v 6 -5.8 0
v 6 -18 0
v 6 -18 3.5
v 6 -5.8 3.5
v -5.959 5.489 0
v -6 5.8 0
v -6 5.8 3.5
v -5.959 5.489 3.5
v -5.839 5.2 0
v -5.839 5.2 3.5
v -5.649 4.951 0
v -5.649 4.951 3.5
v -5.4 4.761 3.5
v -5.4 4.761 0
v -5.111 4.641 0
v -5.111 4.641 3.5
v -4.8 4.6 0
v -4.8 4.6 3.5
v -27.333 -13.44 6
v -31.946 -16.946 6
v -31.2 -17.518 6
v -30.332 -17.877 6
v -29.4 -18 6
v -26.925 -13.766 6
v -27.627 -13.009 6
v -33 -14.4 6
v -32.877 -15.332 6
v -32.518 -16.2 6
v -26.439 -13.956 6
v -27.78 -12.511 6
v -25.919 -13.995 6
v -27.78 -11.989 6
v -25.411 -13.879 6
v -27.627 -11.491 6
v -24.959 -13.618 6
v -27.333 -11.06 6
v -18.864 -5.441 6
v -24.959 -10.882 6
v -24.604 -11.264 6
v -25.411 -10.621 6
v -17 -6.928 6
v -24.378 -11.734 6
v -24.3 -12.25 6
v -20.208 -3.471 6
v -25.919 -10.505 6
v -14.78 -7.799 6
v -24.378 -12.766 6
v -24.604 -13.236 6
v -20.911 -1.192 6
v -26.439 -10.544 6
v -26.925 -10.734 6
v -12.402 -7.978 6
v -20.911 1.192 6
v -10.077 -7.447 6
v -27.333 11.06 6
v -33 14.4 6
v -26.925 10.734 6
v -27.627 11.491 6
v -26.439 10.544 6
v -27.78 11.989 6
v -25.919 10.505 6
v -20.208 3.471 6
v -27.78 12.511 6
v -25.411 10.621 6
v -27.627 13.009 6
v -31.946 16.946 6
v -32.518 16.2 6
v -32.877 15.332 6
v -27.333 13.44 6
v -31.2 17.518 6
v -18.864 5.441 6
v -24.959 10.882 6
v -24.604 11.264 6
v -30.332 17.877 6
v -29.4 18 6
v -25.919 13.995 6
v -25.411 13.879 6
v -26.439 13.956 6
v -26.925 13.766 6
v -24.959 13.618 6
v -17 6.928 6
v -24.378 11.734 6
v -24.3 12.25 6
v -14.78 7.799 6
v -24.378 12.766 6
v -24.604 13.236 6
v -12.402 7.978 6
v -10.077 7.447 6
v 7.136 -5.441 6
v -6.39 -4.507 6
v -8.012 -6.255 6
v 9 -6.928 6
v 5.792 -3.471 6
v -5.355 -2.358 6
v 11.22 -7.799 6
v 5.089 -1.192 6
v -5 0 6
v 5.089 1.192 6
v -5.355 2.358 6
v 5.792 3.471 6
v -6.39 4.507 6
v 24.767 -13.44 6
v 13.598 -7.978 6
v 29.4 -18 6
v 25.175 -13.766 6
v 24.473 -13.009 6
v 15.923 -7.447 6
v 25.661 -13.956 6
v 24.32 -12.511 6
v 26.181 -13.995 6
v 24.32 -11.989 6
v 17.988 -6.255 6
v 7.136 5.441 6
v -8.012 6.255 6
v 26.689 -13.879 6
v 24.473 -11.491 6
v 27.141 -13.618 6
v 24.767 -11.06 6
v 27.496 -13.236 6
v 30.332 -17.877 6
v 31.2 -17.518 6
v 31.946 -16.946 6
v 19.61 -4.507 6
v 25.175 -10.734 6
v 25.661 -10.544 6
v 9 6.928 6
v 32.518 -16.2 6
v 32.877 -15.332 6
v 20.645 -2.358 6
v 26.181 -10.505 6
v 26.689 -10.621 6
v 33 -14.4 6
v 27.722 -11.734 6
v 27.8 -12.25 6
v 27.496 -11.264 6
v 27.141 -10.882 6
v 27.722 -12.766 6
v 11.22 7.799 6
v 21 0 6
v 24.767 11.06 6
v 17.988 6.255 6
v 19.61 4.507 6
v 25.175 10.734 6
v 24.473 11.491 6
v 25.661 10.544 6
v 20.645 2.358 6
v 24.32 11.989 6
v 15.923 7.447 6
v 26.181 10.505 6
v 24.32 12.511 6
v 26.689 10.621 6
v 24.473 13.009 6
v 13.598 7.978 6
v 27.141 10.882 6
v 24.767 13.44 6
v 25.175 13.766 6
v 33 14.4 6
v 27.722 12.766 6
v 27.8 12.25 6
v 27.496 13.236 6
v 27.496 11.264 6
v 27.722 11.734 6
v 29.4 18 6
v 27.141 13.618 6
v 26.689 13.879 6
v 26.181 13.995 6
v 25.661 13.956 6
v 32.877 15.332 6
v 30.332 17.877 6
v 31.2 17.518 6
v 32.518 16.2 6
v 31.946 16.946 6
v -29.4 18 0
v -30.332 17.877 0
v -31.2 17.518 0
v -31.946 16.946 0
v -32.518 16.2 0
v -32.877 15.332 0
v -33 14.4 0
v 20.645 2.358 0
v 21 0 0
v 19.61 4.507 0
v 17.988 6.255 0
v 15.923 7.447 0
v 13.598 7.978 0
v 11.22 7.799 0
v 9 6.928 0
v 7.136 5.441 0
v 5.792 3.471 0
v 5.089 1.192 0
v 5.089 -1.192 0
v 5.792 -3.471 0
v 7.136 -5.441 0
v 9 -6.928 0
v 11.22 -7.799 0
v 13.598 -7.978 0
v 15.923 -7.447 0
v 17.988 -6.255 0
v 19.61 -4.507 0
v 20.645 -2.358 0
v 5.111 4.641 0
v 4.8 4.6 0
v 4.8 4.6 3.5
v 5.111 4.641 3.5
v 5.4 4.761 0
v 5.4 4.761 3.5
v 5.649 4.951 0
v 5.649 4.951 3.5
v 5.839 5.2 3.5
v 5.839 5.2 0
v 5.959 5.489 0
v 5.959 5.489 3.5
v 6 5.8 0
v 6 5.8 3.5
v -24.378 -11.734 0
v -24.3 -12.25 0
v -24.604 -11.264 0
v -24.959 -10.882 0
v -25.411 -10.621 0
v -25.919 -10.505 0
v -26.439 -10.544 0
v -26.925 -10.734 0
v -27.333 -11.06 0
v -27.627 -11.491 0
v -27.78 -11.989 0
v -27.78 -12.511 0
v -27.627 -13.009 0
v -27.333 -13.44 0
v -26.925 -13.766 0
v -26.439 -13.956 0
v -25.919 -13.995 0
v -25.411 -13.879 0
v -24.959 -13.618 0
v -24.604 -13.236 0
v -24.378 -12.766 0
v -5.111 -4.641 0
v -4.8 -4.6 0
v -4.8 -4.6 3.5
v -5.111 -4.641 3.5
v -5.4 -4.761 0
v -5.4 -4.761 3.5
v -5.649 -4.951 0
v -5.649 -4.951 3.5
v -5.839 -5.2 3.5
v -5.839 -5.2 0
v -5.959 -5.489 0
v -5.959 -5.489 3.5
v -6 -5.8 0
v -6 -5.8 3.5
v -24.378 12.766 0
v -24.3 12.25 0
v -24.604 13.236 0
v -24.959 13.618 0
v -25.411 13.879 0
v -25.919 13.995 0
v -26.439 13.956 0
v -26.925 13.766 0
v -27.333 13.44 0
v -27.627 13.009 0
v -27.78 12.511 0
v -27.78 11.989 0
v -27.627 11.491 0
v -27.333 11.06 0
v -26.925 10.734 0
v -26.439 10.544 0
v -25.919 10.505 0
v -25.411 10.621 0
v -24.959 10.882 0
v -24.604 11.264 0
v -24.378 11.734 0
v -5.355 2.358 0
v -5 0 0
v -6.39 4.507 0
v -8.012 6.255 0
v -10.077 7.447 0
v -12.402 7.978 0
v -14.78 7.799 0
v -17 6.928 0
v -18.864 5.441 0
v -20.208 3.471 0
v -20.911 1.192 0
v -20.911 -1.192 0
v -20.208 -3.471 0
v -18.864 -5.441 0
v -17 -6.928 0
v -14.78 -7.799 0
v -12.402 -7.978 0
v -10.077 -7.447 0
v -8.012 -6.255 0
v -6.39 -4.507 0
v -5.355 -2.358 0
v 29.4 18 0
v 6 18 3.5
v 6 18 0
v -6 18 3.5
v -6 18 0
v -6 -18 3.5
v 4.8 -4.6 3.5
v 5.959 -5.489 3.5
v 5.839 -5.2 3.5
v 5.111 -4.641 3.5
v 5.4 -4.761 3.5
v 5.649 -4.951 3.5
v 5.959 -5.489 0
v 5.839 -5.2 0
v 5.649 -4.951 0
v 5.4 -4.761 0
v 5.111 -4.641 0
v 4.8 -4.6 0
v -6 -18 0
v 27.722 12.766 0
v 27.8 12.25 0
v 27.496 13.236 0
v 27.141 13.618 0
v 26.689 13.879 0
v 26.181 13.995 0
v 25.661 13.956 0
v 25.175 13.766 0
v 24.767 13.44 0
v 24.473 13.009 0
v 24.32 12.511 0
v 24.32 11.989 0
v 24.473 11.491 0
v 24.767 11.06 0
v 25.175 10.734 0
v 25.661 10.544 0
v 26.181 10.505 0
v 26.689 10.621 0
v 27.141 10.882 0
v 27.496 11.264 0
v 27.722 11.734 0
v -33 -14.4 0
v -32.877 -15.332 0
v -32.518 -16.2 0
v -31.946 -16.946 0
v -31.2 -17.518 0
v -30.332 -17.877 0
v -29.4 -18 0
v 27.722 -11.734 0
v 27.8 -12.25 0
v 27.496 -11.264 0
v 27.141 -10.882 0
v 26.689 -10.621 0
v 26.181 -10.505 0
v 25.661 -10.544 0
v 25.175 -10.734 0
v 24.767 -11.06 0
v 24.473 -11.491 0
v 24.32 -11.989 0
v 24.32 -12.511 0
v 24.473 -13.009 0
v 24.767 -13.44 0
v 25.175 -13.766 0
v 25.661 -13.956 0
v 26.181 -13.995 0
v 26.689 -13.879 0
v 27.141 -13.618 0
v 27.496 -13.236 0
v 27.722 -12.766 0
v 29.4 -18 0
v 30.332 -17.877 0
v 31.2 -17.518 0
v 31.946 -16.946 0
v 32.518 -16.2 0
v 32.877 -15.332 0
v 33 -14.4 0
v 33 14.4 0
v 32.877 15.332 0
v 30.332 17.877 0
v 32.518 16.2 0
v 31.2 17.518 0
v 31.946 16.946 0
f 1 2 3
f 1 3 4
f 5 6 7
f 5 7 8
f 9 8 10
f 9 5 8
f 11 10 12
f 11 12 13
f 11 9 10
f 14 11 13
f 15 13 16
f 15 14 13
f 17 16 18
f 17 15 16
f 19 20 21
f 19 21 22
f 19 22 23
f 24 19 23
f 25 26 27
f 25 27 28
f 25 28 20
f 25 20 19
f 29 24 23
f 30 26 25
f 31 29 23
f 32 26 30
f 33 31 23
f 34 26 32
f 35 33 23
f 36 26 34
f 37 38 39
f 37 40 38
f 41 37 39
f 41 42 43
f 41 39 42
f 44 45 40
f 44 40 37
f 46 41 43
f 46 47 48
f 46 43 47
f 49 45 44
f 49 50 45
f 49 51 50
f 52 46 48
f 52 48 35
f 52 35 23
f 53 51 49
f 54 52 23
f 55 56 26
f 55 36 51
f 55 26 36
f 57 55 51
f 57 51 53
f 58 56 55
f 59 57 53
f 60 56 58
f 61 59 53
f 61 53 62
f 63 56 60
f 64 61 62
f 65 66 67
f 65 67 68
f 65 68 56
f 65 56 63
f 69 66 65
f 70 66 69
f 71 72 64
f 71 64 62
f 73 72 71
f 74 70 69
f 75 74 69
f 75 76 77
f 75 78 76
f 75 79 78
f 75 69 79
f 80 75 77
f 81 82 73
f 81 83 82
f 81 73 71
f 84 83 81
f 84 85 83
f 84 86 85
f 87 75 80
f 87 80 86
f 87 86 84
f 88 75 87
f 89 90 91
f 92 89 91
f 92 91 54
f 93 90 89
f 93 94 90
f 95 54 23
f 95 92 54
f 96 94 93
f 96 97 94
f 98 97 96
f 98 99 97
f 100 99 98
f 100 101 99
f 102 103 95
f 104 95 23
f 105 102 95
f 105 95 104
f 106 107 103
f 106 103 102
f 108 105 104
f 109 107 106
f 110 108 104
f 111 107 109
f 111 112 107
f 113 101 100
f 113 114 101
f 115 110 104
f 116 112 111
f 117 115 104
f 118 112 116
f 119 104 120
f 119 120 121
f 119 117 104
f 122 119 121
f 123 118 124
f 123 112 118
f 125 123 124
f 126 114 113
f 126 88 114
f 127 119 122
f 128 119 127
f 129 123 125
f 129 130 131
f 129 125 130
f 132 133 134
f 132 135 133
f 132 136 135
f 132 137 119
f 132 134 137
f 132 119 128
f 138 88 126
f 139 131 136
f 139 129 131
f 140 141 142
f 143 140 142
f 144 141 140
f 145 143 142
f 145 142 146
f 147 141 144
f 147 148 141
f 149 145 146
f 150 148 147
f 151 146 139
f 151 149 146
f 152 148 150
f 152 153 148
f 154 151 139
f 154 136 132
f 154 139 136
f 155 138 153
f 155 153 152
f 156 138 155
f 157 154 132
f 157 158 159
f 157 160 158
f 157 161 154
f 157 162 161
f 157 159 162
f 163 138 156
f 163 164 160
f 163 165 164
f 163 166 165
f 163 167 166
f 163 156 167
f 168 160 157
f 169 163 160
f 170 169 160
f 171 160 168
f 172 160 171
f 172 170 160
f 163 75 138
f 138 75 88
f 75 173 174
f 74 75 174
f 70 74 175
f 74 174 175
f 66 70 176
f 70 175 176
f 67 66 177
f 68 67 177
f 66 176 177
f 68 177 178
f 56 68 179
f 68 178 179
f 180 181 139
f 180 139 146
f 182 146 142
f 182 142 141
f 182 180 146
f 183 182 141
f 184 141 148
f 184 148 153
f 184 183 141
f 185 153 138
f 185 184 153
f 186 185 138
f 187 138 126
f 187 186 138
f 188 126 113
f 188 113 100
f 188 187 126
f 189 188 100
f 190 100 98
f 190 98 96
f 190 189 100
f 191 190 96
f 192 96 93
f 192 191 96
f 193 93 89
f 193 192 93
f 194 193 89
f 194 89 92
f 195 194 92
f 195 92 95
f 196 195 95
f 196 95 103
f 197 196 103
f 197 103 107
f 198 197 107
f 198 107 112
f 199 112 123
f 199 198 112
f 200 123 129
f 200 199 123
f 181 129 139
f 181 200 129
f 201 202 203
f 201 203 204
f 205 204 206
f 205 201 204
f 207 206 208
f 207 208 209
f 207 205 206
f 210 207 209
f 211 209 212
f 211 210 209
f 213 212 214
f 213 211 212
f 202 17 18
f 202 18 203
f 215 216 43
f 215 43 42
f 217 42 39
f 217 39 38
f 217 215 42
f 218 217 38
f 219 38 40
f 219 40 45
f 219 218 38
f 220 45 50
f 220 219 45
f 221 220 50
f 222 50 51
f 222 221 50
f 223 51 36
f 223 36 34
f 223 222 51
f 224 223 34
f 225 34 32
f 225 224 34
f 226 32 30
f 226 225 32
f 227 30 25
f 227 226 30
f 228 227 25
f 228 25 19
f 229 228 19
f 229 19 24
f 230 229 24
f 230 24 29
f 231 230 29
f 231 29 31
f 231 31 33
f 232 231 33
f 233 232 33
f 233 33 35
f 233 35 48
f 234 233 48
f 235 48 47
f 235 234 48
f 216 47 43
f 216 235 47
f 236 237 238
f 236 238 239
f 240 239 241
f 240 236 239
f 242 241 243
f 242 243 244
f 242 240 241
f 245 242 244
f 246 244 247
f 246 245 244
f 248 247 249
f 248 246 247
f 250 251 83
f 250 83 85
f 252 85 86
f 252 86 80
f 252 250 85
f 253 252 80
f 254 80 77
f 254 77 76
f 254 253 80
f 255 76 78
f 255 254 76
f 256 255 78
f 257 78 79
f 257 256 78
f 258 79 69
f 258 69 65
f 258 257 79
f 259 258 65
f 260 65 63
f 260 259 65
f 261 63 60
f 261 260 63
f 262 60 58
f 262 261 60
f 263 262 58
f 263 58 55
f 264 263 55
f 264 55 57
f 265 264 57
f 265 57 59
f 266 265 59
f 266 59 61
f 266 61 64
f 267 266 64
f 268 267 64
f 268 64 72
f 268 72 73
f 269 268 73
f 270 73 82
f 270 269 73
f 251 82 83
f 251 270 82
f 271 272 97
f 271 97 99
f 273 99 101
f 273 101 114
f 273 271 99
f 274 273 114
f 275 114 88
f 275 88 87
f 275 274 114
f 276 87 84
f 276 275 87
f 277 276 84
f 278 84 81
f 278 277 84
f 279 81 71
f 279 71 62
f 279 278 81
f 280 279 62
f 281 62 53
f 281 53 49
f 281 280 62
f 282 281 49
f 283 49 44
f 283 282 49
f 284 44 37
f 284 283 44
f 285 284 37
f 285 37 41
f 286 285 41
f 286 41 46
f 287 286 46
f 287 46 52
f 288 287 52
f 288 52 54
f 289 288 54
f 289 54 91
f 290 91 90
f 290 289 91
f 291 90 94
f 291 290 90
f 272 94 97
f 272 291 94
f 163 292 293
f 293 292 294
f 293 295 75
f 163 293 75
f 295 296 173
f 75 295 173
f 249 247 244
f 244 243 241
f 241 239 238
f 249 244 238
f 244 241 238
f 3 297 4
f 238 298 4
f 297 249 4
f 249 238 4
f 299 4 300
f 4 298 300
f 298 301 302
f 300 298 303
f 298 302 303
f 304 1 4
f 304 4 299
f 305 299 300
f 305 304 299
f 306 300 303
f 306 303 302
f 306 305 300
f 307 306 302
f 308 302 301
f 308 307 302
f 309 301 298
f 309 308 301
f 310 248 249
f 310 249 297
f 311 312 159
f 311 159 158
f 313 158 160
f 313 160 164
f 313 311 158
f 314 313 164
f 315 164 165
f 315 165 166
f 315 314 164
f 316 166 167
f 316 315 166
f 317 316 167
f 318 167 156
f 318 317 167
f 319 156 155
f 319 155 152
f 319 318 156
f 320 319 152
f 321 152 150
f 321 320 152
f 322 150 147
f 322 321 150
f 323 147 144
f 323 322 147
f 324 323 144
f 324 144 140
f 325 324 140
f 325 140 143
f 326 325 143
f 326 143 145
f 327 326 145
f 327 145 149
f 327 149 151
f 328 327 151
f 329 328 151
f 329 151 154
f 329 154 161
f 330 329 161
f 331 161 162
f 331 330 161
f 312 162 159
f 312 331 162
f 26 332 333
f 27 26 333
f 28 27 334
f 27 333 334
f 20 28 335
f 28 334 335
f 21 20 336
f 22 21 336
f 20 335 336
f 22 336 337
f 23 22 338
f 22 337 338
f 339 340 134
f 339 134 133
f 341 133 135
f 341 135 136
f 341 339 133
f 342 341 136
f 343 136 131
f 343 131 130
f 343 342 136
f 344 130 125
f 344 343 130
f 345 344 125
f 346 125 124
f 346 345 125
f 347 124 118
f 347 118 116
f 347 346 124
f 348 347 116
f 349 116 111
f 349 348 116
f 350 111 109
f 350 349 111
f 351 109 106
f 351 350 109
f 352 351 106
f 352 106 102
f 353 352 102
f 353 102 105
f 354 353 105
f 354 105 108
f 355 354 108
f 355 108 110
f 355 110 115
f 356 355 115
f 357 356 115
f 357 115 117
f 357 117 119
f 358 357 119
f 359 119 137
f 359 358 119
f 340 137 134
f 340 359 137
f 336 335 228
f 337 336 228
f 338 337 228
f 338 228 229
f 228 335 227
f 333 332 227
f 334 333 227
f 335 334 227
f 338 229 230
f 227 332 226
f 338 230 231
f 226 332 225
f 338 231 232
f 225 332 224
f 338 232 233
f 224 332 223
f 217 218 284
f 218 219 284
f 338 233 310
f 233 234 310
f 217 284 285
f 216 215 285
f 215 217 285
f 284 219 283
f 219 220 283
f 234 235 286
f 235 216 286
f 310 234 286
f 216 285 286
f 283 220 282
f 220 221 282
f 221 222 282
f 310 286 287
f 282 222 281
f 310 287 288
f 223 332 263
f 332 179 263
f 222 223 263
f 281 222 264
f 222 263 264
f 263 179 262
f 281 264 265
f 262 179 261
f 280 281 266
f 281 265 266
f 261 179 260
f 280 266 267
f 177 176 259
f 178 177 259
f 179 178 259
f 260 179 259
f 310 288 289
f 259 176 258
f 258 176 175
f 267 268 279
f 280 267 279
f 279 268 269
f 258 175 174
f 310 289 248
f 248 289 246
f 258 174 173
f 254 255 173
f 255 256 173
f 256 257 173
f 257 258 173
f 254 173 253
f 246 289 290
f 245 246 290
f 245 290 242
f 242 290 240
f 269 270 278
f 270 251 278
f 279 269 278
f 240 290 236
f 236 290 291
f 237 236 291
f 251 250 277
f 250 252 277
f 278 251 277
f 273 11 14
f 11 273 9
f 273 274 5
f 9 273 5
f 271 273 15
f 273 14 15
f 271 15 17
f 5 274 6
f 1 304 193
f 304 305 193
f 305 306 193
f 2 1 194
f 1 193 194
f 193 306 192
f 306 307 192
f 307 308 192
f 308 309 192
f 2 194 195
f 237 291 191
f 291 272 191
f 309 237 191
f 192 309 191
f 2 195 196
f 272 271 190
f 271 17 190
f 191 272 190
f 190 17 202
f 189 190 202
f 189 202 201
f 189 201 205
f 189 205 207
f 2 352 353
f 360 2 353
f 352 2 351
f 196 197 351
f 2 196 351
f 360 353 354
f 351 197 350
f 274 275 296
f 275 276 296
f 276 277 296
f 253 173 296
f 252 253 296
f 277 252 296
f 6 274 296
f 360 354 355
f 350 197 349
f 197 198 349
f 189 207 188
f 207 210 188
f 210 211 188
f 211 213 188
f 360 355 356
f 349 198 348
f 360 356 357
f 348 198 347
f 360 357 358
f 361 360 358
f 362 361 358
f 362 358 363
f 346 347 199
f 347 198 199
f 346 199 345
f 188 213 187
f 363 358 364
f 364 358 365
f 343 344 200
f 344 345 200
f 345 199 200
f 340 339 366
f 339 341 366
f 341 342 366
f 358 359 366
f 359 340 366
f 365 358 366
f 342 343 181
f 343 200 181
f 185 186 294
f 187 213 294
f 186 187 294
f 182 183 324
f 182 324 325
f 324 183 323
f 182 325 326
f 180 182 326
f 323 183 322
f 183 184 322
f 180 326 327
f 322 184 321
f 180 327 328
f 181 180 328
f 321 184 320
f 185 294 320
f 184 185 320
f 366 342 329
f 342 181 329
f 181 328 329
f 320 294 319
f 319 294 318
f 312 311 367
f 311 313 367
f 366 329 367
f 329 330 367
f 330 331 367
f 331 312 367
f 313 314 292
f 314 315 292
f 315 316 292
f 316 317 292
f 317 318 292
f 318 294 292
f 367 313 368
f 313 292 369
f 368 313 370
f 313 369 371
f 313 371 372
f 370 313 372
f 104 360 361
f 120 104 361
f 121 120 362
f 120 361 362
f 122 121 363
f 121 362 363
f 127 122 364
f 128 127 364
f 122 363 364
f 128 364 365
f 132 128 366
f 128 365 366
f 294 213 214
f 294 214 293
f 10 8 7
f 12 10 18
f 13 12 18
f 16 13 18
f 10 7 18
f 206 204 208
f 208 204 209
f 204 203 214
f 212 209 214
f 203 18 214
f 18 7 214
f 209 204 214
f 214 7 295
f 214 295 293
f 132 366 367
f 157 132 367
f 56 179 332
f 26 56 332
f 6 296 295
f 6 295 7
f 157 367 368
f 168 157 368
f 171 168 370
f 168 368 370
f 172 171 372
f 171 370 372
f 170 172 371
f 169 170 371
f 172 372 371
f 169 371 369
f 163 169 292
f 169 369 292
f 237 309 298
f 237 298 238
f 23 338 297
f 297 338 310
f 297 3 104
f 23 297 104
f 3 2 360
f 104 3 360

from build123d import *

# Parameters (mm, degrees)
F0_R     = 1.75
F0_R_2   = 8
F1_DEPTH = 6
F3_DEPTH = 3.5


with BuildPart() as f1:
    # F0 (on Top) → F1 (new body)
    with BuildSketch(Plane.XY):
        with BuildLine():
            ThreePointArc((33, 14.4), (31.945584, 16.945584), (29.4, 18))
            Line((29.4, 18), (-29.4, 18))
            ThreePointArc((-29.4, 18), (-31.945584, 16.945584), (-33, 14.4))
            Line((-33, 14.4), (-33, -14.4))
            ThreePointArc((-33, -14.4), (-31.945584, -16.945584), (-29.4, -18))
            Line((-29.4, -18), (29.4, -18))
            ThreePointArc((29.4, -18), (31.945584, -16.945584), (33, -14.4))
            Line((33, -14.4), (33, 14.4))
        make_face()
        with Locations((-26.05, -12.25)):
            Circle(F0_R, mode=Mode.SUBTRACT)
        with Locations((26.05, -12.25)):
            Circle(F0_R, mode=Mode.SUBTRACT)
        with Locations((-13, 0)):
            Circle(F0_R_2, mode=Mode.SUBTRACT)
        with Locations((-26.05, 12.25)):
            Circle(F0_R, mode=Mode.SUBTRACT)
        with Locations((13, 0)):
            Circle(F0_R_2, mode=Mode.SUBTRACT)
        with Locations((26.05, 12.25)):
            Circle(F0_R, mode=Mode.SUBTRACT)
    extrude(amount=F1_DEPTH)

    # F2 (on face) → F3 (cut)
    with BuildSketch(Plane.XY):
        with BuildLine():
            Line((-6, -18), (6, -18))
            Line((6, -18), (6, -5.8))
            ThreePointArc((6, -5.8), (5.648528, -4.951472), (4.8, -4.6))
            Line((4.8, -4.6), (-4.8, -4.6))
            ThreePointArc((-4.8, -4.6), (-5.648528, -4.951472), (-6, -5.8))
            Line((-6, -5.8), (-6, -18))
        make_face()
        with BuildLine():
            ThreePointArc((4.8, 4.6), (5.648528, 4.951472), (6, 5.8))
            Line((6, 5.8), (6, 18))
            Line((6, 18), (-6, 18))
            Line((-6, 18), (-6, 5.8))
            ThreePointArc((-6, 5.8), (-5.648528, 4.951472), (-4.8, 4.6))
            Line((-4.8, 4.6), (4.8, 4.6))
        make_face()
    extrude(amount=F3_DEPTH, mode=Mode.SUBTRACT)


solid = f1.part
